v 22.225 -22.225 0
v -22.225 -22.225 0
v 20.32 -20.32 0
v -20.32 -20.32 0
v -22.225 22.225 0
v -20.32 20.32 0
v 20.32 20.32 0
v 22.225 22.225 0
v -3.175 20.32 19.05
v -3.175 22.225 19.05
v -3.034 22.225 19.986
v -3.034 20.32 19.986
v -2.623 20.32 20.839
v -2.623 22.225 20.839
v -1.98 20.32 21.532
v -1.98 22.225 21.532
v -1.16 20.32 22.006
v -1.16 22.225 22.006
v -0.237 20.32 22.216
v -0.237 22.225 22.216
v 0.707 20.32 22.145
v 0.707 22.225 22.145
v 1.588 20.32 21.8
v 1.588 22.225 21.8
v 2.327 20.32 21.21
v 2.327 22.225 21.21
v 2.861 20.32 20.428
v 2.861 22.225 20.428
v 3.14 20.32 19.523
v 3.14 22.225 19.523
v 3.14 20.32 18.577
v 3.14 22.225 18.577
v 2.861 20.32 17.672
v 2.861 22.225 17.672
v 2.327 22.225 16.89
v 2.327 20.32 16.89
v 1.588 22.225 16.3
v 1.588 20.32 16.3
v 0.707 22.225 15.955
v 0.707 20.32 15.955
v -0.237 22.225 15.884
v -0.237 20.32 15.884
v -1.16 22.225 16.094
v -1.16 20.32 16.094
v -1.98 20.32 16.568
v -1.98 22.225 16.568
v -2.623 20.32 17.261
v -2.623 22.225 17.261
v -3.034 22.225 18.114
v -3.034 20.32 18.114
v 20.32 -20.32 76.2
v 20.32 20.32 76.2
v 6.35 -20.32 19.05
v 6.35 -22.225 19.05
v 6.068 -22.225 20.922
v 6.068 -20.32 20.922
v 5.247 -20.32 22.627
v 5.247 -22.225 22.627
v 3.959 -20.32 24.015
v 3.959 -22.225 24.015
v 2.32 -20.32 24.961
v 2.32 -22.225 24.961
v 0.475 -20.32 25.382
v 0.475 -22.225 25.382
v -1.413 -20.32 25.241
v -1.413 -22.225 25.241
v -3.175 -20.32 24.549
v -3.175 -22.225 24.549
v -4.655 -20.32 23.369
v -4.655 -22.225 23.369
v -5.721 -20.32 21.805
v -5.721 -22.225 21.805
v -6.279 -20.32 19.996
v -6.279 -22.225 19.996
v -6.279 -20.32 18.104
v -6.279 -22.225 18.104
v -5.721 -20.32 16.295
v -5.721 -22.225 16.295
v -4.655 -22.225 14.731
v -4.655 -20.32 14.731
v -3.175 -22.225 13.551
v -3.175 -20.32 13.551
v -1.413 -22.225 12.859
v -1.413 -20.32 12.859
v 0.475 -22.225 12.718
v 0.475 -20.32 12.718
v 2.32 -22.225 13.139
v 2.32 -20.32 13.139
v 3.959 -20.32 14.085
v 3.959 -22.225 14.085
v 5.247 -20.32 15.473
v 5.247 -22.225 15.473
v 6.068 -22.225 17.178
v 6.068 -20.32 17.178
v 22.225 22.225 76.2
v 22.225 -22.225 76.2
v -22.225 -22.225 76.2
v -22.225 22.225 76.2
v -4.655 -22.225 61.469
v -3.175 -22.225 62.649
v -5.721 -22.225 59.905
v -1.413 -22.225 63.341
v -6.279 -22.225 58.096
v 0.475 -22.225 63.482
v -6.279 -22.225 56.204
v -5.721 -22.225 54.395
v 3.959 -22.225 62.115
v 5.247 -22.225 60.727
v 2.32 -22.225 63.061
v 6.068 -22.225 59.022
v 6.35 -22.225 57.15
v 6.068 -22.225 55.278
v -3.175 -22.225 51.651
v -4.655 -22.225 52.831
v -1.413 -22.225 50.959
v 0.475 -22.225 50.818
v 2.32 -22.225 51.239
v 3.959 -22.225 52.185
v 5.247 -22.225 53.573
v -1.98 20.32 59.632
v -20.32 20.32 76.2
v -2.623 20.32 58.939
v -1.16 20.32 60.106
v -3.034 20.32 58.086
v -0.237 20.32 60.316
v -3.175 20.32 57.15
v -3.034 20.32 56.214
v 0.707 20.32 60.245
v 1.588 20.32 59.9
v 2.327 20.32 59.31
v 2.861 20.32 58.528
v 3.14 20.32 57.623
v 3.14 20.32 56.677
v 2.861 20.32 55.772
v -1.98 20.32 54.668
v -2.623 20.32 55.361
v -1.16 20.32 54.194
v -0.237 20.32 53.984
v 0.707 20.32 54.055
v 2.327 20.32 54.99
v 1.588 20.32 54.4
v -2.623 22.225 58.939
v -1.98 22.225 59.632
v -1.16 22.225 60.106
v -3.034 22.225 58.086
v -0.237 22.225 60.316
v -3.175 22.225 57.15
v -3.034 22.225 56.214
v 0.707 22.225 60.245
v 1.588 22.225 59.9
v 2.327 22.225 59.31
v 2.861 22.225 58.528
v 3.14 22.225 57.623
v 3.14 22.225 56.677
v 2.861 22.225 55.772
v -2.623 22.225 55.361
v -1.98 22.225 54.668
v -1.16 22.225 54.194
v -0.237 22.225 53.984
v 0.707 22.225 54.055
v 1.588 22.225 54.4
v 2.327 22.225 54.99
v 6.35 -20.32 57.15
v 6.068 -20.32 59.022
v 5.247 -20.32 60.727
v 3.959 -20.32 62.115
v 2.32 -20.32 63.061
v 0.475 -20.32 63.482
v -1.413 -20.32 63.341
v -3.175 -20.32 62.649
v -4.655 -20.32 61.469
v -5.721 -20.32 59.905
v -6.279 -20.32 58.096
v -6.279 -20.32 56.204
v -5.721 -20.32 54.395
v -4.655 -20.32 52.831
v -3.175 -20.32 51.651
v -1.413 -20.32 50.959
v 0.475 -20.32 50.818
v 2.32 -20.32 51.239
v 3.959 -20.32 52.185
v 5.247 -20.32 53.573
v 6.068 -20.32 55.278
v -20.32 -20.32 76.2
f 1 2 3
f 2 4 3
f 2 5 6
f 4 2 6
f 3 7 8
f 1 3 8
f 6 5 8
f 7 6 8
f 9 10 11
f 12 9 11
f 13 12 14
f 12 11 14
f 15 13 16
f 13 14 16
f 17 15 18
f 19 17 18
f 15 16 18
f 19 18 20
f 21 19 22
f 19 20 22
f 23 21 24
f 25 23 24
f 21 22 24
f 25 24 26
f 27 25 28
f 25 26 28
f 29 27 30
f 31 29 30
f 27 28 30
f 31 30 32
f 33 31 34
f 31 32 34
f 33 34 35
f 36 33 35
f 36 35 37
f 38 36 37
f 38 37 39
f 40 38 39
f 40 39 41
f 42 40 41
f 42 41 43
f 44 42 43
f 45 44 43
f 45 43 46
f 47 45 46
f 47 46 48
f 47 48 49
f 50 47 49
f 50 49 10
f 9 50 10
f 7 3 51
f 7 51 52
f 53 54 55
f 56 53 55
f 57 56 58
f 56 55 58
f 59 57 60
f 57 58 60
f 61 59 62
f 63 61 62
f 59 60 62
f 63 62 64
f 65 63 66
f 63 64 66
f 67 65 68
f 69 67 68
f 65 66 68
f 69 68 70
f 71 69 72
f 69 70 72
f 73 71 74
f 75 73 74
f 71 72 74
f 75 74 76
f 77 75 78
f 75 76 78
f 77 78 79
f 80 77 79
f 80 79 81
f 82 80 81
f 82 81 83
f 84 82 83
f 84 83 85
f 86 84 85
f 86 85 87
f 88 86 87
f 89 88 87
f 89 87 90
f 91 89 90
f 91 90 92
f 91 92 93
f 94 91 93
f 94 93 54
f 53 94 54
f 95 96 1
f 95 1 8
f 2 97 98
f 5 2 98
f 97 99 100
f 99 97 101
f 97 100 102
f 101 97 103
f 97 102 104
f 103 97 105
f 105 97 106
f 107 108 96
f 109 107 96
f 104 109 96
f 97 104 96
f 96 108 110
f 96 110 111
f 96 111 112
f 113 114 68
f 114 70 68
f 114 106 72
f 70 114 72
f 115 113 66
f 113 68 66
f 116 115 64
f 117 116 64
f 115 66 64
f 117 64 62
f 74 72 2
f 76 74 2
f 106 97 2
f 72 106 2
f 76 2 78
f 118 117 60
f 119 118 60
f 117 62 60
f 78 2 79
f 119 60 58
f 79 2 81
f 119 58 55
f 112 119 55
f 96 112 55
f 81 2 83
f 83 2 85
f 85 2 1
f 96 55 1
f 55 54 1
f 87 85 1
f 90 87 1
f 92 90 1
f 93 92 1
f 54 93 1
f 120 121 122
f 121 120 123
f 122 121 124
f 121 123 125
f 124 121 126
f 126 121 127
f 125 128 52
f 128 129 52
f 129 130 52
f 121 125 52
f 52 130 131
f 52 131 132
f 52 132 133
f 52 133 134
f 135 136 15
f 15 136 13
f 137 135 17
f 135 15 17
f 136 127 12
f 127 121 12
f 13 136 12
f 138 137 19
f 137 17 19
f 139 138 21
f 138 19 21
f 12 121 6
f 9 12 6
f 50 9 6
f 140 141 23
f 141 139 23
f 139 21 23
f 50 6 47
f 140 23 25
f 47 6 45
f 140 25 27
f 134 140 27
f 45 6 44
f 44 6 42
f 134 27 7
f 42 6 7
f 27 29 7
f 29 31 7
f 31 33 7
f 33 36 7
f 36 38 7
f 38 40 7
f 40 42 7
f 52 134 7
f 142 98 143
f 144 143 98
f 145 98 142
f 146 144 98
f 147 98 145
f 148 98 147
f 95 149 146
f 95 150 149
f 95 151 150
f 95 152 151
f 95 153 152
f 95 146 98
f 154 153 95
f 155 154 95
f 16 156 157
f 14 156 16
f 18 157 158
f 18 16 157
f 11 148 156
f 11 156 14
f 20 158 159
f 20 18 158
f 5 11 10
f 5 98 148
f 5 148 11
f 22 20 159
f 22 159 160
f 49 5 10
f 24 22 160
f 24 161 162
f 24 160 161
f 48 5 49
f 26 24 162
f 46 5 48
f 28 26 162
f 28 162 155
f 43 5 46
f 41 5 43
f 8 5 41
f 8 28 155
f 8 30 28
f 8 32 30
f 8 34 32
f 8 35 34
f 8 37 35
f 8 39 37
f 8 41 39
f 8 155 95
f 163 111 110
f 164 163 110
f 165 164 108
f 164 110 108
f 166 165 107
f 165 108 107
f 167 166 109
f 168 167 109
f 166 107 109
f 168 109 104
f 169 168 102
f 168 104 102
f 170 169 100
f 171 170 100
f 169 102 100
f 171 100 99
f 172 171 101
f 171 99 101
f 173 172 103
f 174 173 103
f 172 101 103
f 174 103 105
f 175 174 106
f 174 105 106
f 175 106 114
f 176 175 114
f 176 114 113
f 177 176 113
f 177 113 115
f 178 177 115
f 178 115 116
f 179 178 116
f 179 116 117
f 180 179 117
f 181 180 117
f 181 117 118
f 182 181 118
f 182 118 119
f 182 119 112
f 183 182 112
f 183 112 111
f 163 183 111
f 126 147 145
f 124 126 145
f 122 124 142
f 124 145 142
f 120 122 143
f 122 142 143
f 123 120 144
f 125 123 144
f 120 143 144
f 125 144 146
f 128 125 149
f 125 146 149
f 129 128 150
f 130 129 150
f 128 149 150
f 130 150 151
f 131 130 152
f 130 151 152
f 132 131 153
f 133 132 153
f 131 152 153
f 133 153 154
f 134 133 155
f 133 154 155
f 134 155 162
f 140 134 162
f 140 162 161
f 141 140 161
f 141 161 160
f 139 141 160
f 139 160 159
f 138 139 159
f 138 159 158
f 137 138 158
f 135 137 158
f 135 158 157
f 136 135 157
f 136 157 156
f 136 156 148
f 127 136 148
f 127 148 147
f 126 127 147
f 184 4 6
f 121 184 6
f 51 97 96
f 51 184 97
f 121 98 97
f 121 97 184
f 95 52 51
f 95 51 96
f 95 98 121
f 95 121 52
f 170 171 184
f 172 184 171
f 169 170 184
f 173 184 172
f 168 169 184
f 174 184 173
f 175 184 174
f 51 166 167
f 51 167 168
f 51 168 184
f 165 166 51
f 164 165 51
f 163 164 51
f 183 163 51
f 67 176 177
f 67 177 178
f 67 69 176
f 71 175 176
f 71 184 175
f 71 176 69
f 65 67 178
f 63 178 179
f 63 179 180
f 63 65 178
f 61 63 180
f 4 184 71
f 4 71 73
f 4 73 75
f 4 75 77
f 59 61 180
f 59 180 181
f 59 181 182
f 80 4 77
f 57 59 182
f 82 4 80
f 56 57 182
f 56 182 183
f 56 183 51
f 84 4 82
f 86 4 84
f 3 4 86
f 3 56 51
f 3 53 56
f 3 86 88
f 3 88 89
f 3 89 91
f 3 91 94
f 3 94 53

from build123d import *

# Parameters (mm, degrees)
F0_W     = 44.45
F0_H     = 44.45
F0_W_2   = 40.64
F0_H_2   = 40.64
F1_DEPTH = 76.2
F2_R     = 6.35
F3_DEPTH = 25.4
F4_R     = 3.175
F5_DEPTH = 25.4


with BuildPart() as f1:
    # F0 (on Top) → F1 (new body)
    with BuildSketch(Plane.XY):
        Rectangle(F0_W, F0_H)
        Rectangle(F0_W_2, F0_H_2, mode=Mode.SUBTRACT)
    extrude(amount=F1_DEPTH)

    # F2 (on face) → F3 (cut)
    with BuildSketch(Plane.XZ.offset(22.225)):
        with Locations((0, 57.15)):
            Circle(F2_R)
        with Locations((0, 19.05)):
            Circle(F2_R)
    extrude(amount=-F3_DEPTH, mode=Mode.SUBTRACT)

    # F4 (on face) → F5 (cut)
    with BuildSketch(Plane(origin=(0, 22.225, 0), x_dir=(-1, 0, 0), z_dir=(0, 1, 0))):
        with Locations((0, 57.15)):
            Circle(F4_R)
        with Locations((0, 19.05)):
            Circle(F4_R)
    extrude(amount=-F5_DEPTH, mode=Mode.SUBTRACT)


solid = f1.part
